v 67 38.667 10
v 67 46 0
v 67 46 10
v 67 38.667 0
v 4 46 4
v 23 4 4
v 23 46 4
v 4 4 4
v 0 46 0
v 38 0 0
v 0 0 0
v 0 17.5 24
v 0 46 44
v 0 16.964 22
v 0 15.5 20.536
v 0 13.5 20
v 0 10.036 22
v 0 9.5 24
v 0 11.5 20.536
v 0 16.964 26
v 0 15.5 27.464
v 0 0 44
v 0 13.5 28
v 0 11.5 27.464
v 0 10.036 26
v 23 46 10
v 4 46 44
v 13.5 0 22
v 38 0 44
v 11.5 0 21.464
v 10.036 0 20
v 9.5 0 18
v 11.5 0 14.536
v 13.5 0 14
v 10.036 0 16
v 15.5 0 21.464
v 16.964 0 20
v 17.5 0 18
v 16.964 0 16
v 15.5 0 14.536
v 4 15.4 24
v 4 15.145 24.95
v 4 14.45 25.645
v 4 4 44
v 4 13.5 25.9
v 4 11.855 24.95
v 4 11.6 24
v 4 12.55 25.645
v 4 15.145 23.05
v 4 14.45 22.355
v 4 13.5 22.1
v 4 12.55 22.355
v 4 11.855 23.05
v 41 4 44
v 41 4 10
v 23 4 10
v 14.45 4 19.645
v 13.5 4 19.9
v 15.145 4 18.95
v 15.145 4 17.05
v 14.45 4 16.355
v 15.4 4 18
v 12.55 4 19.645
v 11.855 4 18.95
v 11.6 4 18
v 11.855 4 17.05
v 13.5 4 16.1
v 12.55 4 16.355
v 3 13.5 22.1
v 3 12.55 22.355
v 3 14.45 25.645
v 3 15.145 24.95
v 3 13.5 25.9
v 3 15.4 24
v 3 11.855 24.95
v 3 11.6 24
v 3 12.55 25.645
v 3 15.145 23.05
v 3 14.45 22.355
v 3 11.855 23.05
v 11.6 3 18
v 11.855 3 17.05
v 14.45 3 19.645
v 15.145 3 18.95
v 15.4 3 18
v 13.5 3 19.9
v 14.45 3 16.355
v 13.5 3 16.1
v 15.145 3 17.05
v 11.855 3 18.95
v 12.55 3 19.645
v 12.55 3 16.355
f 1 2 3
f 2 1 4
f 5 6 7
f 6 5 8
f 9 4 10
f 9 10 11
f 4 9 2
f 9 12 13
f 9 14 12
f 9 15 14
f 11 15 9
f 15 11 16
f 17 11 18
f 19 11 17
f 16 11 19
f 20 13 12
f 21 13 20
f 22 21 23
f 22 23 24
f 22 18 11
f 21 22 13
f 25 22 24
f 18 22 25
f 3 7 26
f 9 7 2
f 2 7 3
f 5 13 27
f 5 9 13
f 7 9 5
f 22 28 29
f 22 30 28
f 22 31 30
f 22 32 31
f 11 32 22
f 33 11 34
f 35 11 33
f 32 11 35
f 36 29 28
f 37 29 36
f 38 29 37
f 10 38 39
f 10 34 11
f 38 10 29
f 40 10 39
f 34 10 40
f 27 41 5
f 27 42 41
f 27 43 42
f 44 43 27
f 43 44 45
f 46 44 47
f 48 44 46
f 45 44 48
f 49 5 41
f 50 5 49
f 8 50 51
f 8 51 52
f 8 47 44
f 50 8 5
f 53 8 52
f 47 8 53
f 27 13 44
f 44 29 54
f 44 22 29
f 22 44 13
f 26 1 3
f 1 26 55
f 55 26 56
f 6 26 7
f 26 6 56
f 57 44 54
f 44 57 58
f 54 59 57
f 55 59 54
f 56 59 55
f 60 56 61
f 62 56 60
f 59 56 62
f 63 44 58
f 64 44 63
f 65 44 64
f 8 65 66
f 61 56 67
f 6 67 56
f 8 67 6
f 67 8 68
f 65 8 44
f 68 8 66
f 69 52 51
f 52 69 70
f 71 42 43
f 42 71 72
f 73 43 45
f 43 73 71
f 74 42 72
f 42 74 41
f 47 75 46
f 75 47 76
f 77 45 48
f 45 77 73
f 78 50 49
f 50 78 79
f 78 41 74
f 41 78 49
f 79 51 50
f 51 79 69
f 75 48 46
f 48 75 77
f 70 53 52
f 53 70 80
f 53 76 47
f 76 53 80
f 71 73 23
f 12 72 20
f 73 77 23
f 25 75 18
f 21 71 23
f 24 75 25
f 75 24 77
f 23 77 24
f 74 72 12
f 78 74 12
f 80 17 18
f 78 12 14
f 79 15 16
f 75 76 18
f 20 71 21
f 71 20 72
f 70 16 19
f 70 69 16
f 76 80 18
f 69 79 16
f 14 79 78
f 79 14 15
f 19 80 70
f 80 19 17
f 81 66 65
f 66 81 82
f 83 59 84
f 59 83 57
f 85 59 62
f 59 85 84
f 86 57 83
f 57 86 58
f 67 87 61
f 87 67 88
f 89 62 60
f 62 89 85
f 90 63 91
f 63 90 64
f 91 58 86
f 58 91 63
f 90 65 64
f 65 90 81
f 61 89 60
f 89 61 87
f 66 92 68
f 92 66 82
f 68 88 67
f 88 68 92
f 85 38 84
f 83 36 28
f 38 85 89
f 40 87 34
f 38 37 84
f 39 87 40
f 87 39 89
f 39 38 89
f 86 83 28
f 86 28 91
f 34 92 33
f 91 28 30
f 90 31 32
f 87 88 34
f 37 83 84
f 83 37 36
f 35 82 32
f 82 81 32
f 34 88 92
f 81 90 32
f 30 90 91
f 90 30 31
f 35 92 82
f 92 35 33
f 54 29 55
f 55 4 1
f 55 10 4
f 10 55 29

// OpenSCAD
difference(){
	union() {
		cube(size = [67, 46, 4]);
		translate(v = [0, 0, 4]) {
			cube(size = [4, 46, 40]);
		}
		translate(v = [23, 0, 4]) {
			cube(size = [44, 46, 6]);
		}
		translate(v = [0, 0, 4]) {
			cube(size = [67, 4, 40]);
		}
	}
	/* Holes Below*/
	union(){
		translate(v = [41, 4, 0]) {
			rotate(a = -36.8700000000, v = [0, 0, 1]) {
				translate(v = [0, -10, 0]) {
					cube(size = [50, 60, 50]);
				}
			}
		}
		translate(v = [0, 13.5000000000, 24.0000000000]) {
			rotate(a = -90, v = [0, 1, 0]) {
				union() {
					union() {
						translate(v = [0, 0, -5]) {
							cylinder($fn = 12, h = 5, r = 1.9000000000);
						}
						translate(v = [0, 0, -3]) {
							cylinder($fn = 12, h = 3, r1 = 1.9000000000, r2 = 4);
						}
					}
					cylinder($fn = 12, h = 1, r = 4);
				}
			}
		}
		translate(v = [13.5000000000, 0, 18.0000000000]) {
			rotate(a = 90, v = [1, 0, 0]) {
				union() {
					union() {
						translate(v = [0, 0, -5]) {
							cylinder($fn = 12, h = 5, r = 1.9000000000);
						}
						translate(v = [0, 0, -3]) {
							cylinder($fn = 12, h = 3, r1 = 1.9000000000, r2 = 4);
						}
					}
					cylinder($fn = 12, h = 1, r = 4);
				}
			}
		}
	} /* End Holes */ 
}
